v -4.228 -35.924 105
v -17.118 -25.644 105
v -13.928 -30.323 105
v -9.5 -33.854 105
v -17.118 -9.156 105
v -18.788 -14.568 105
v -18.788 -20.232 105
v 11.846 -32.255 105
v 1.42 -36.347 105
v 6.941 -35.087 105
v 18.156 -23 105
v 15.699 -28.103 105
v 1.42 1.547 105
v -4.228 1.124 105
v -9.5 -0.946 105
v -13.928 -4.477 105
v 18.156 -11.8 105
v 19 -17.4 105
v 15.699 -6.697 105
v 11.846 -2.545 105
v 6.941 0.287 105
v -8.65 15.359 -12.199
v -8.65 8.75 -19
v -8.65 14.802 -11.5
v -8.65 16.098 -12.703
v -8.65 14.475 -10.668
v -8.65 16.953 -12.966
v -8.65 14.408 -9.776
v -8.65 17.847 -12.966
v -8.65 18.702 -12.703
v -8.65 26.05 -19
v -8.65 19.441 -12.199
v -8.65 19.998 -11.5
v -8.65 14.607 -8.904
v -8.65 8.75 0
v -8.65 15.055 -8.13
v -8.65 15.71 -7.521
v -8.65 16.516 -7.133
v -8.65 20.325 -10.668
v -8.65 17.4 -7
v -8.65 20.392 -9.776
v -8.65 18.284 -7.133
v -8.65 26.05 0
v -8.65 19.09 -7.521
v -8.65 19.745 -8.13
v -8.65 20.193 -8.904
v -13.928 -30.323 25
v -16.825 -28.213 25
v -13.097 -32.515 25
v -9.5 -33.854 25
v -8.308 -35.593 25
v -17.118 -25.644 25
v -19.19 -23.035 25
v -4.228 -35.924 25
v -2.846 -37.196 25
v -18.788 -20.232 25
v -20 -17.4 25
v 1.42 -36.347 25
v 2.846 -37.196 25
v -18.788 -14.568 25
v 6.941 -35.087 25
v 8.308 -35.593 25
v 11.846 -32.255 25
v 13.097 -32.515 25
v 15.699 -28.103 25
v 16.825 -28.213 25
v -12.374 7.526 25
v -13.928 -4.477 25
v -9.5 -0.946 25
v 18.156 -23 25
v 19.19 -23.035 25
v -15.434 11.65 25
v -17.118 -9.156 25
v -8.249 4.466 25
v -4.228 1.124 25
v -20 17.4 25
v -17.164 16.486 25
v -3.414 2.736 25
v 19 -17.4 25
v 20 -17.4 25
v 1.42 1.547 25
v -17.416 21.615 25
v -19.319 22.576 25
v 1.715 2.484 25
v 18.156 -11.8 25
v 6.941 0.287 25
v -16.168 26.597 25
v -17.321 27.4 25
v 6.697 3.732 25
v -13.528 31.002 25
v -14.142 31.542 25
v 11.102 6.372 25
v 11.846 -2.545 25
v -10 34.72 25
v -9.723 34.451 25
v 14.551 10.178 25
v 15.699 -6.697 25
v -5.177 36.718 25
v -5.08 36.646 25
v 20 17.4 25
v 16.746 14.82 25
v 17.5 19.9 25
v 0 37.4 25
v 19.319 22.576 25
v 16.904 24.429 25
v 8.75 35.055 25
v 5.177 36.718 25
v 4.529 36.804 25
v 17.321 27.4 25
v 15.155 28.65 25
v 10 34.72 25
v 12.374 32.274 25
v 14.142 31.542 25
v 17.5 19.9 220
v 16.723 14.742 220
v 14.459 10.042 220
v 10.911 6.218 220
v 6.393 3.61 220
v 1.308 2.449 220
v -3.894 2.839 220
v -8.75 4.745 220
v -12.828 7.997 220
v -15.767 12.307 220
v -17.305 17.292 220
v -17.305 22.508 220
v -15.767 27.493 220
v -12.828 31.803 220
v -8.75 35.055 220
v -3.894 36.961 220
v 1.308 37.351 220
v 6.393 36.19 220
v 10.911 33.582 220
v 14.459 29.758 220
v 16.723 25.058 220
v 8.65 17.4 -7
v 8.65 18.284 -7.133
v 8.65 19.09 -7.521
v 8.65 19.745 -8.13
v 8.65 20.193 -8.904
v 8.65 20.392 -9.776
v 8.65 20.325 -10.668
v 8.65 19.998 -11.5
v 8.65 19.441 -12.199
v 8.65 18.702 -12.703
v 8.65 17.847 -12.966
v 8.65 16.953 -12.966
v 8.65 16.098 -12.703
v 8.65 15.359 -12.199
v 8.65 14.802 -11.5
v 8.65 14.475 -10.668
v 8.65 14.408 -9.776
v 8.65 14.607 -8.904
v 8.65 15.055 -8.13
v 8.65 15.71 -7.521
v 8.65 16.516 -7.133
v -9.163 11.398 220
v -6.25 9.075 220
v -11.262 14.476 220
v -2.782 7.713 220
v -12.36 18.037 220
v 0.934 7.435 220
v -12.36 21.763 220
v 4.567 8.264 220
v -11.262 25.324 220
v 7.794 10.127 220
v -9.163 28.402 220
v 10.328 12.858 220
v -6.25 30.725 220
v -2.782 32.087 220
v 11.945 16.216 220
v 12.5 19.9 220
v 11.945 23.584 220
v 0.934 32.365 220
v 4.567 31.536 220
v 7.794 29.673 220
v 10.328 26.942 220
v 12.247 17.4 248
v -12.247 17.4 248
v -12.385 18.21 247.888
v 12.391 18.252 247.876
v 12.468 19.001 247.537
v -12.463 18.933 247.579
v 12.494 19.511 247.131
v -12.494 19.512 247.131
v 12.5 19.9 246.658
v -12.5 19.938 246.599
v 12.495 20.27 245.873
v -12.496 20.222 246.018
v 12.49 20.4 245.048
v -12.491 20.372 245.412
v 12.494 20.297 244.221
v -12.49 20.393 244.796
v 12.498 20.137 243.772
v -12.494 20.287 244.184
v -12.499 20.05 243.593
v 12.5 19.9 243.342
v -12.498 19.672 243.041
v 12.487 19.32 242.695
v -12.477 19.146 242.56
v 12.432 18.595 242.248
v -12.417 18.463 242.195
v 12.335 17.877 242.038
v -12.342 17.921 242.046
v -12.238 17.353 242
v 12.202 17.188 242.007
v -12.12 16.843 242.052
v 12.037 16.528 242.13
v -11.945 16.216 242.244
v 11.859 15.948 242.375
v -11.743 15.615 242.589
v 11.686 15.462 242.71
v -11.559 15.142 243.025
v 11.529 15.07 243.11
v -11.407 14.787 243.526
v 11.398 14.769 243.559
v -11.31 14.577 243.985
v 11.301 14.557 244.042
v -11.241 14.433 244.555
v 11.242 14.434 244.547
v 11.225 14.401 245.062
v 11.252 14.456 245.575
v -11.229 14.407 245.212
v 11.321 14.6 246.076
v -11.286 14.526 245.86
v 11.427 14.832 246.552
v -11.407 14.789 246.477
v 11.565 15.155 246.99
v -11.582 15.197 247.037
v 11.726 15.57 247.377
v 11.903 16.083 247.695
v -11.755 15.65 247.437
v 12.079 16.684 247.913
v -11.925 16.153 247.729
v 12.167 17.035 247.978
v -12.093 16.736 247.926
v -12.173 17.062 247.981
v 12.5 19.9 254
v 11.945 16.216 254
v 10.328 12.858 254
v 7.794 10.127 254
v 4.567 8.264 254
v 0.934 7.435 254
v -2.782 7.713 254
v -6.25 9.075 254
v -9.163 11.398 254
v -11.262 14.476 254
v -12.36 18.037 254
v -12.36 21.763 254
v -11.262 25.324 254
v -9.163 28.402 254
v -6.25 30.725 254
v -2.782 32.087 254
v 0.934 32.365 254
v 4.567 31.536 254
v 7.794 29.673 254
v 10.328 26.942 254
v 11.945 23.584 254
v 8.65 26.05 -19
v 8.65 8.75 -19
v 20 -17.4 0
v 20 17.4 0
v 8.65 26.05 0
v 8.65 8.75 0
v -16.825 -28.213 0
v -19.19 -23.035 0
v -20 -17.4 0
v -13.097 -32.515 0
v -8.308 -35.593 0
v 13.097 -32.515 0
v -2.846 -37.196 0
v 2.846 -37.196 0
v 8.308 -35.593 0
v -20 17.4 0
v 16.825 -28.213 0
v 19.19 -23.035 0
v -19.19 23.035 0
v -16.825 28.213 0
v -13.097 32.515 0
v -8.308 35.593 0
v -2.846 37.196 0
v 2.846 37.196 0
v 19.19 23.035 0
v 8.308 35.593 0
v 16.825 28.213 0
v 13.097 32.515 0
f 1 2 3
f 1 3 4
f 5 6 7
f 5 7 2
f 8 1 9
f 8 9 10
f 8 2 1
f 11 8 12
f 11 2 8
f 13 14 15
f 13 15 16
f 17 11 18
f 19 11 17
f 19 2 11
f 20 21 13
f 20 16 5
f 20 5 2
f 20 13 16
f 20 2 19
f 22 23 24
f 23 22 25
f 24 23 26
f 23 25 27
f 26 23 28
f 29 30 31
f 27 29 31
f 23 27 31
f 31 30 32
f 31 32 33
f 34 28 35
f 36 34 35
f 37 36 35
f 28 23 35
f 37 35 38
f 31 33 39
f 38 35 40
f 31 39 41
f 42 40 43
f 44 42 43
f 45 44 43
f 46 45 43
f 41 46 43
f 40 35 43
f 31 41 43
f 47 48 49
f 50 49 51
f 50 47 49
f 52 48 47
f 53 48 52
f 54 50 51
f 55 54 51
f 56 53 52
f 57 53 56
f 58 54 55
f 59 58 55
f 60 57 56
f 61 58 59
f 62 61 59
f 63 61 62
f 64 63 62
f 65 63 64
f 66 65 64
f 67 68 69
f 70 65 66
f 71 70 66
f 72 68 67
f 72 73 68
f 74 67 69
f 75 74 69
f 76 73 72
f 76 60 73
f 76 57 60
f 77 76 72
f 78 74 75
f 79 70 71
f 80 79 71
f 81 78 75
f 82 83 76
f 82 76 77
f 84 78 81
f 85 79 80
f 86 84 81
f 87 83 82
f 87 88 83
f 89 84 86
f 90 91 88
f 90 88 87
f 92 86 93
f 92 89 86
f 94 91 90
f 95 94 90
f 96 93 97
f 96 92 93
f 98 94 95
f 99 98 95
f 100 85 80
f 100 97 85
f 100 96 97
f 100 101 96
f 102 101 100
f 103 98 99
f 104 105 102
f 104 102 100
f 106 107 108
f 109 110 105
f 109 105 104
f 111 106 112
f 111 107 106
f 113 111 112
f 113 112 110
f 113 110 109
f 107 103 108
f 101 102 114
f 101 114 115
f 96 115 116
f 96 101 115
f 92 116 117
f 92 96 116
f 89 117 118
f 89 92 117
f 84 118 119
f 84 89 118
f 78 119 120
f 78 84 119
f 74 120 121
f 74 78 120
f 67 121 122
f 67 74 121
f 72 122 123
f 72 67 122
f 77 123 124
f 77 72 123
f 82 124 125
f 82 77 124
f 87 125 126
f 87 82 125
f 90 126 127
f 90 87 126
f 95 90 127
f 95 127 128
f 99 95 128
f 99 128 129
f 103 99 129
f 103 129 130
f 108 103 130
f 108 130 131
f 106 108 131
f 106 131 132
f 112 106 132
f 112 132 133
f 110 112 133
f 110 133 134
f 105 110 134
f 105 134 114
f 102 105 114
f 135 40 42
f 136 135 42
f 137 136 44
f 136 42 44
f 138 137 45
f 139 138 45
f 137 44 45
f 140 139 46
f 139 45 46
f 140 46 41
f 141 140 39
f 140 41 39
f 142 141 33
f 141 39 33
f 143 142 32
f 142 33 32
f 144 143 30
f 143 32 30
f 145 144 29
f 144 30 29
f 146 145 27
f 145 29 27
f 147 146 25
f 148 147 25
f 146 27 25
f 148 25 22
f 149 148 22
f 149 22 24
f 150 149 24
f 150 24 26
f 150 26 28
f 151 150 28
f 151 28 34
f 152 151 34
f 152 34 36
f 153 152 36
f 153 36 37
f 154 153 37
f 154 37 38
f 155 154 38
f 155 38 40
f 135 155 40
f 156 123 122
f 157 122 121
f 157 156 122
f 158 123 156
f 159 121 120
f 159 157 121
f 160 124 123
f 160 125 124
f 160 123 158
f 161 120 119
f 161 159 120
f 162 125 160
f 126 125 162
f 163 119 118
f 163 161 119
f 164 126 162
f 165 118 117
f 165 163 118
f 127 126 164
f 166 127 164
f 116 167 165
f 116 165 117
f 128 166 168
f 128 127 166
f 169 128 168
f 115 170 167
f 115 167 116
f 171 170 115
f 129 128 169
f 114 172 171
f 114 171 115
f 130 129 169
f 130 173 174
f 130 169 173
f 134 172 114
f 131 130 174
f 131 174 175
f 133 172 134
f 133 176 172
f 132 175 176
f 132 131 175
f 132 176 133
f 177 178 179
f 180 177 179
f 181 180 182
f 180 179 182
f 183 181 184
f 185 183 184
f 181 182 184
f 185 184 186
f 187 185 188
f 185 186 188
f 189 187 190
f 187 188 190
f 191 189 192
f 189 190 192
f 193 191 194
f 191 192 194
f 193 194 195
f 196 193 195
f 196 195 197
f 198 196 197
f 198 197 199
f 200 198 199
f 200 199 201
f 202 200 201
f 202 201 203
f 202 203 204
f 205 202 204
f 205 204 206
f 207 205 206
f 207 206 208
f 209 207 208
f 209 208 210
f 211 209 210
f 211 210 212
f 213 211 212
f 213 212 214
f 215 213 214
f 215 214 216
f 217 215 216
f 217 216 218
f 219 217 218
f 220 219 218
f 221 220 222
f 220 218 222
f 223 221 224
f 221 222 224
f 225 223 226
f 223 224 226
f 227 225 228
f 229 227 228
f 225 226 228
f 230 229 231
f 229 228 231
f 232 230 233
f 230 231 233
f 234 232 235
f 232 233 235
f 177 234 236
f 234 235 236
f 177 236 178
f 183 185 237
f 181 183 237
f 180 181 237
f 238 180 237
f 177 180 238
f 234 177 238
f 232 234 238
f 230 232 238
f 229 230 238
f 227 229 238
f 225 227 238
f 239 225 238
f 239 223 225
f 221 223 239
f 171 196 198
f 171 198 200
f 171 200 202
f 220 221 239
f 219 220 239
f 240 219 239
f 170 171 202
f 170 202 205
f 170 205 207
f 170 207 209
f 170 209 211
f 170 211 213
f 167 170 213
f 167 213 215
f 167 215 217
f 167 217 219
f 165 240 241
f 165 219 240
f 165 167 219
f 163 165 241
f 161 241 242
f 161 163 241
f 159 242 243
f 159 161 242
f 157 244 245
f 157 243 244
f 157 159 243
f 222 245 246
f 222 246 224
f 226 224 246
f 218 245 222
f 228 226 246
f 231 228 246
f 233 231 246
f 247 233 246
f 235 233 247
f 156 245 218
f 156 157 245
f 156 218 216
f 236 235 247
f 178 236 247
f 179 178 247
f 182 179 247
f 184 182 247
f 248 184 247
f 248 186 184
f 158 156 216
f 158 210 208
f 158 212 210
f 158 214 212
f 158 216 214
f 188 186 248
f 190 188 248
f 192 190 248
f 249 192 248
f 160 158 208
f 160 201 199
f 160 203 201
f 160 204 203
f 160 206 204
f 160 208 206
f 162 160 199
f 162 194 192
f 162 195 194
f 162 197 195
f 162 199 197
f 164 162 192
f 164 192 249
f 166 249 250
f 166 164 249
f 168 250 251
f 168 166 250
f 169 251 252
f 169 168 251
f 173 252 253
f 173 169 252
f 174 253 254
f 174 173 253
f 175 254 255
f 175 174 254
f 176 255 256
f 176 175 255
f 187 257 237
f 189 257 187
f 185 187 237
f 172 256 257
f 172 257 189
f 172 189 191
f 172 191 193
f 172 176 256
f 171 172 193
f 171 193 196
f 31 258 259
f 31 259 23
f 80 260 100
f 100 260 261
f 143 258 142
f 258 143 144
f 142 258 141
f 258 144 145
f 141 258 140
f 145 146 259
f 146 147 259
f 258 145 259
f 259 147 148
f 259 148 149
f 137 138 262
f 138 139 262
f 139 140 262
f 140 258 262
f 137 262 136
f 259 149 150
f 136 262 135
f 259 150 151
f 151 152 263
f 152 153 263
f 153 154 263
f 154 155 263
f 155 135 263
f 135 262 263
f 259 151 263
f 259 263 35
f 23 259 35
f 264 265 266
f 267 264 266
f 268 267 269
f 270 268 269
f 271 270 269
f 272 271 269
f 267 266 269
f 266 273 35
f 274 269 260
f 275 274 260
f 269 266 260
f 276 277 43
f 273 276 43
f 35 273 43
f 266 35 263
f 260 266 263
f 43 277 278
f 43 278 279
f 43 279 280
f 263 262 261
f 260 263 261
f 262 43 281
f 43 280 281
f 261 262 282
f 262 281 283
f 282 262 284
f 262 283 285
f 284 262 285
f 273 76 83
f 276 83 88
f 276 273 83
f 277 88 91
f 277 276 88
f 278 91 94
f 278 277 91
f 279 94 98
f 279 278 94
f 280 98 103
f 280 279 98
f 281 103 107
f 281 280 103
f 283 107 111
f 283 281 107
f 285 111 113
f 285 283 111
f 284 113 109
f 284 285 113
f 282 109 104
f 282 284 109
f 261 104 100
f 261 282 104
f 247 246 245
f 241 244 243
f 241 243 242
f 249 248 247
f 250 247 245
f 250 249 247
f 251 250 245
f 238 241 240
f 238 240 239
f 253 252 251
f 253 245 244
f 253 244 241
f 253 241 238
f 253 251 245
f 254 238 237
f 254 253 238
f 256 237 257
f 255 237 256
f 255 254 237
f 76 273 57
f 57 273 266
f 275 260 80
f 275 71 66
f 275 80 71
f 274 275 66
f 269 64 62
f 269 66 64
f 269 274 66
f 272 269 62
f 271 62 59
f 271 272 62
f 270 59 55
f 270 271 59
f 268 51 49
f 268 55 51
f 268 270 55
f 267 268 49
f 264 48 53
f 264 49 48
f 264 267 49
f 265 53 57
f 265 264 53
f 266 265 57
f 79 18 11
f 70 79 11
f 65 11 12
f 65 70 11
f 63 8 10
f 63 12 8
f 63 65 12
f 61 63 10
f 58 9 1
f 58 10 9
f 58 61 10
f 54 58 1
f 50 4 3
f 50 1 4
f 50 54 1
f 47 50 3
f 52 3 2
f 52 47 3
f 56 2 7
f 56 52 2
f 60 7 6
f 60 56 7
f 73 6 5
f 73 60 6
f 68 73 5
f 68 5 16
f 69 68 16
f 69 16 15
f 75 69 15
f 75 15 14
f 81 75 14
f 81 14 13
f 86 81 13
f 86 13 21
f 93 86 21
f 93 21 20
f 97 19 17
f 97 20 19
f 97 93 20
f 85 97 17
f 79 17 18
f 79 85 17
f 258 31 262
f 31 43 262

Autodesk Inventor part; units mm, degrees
ref_plane "YZ Plane" through (0, 0, 0) normal (1, 0, 0) x (0, 1, 0)
ref_plane "XZ Plane" through (0, 0, 0) normal (0, 1, 0) x (-1, 0, 0)
ref_plane "XY Plane" through (0, 0, 0) normal (0, 0, 1) x (1, 0, 0)
sketch "스케치1" plane through (0, 0, 0) normal (0, 0, 1) x (1, 0, 0)
  line L0 (0, 17.4) -> (0, -17.4) construction
  line L1 (-20, 17.4) -> (-20, -17.4)
  line L2 (20, -17.4) -> (20, 17.4)
  arc A0 (20, 17.4) -> (-20, 17.4) centre (0, 17.4) ccw
  arc A1 (-20, -17.4) -> (20, -17.4) centre (0, -17.4) ccw
  point P0 (0, 0)
  point P1 (0, 0)
  dimension "d0" = 34.8
  dimension "d1" = 40
extrude "돌출1" add sketch "스케치1" along normal blind 25
sketch "스케치2" plane through (0, 0, 25) normal (0, 0, 1) x (1, 0, 0)
  circle A0 centre (0, 19.9) radius 17.5
  arc A1 (20, 17.4) -> (-20, 17.4) centre (0, 17.4) ccw projected
  point P0 (-6.2408, 3.5506)
  dimension "d4" = 35
  dimension "d26" = 0
extrude "돌출2" add sketch "스케치2" along normal blind 195
sketch "스케치3" plane through (0, 19.9, 220) normal (0, 0, 1) x (1, 0, 0)
  circle A0 centre (0, 0) radius 12.5
  point P0 (0, -19.9)
  dimension "d7" = 25
extrude "돌출3" add sketch "스케치3" along normal blind 34
sketch "스케치5" plane through (0, 0, 0) normal (0, 0, -1) x (-1, 0, 0)
  line L0 (-8.65, 8.75) -> (8.65, 8.75)
  line L1 (8.65, 8.75) -> (8.65, 26.05)
  line L2 (8.65, 26.05) -> (-8.65, 26.05)
  line L3 (-8.65, 26.05) -> (-8.65, 8.75)
  arc A0 (20, 17.4) -> (-20, 17.4) centre (0, 17.4) ccw projected
  point P0 (0, 0)
  dimension "d10" = 17.3
  dimension "d11" = 17.3
  dimension "d12" = 8.65
  dimension "d13" = 8.65
extrude "돌출4" add sketch "스케치5" along normal blind 19
sketch "스케치6" plane through (-20, -17.4, 0) normal (-1, 0, 0) x (0, 0, 1)
  circle A0 centre (-10, 34.8) radius 3
  line L0 (-19, 26.15) -> (-19, 43.45) projected
  line L1 (0, 43.45) -> (-19, 43.45) projected
  circle A1 centre (245, 34.8) radius 3
  line L2 (0, 0) -> (25, 0) projected
  point P0 (0, 17.4)
  dimension "d16" = 6
  dimension "d17" = 9
  dimension "d18" = 8.65
  dimension "d19" = 255
  dimension "d20" = 34.8
  dimension "d21" = 6
extrude "돌출5" cut sketch "스케치6" against normal through all
sketch "스케치7" plane through (0, 0, 25) normal (0, 0, 1) x (1, 0, 0)
  circle A0 centre (0, -17.4) radius 19
  arc A1 (-20, -17.4) -> (20, -17.4) centre (0, -17.4) ccw projected
  point P0 (0, 0)
  dimension "d24" = 0
  dimension "d25" = 38
extrude "돌출6" add sketch "스케치7" along normal blind 80
equation "\"d13\" = 0.5 * d10"
properties part number "높이조절 액추에이터_중간" material "알루미늄 6061"
